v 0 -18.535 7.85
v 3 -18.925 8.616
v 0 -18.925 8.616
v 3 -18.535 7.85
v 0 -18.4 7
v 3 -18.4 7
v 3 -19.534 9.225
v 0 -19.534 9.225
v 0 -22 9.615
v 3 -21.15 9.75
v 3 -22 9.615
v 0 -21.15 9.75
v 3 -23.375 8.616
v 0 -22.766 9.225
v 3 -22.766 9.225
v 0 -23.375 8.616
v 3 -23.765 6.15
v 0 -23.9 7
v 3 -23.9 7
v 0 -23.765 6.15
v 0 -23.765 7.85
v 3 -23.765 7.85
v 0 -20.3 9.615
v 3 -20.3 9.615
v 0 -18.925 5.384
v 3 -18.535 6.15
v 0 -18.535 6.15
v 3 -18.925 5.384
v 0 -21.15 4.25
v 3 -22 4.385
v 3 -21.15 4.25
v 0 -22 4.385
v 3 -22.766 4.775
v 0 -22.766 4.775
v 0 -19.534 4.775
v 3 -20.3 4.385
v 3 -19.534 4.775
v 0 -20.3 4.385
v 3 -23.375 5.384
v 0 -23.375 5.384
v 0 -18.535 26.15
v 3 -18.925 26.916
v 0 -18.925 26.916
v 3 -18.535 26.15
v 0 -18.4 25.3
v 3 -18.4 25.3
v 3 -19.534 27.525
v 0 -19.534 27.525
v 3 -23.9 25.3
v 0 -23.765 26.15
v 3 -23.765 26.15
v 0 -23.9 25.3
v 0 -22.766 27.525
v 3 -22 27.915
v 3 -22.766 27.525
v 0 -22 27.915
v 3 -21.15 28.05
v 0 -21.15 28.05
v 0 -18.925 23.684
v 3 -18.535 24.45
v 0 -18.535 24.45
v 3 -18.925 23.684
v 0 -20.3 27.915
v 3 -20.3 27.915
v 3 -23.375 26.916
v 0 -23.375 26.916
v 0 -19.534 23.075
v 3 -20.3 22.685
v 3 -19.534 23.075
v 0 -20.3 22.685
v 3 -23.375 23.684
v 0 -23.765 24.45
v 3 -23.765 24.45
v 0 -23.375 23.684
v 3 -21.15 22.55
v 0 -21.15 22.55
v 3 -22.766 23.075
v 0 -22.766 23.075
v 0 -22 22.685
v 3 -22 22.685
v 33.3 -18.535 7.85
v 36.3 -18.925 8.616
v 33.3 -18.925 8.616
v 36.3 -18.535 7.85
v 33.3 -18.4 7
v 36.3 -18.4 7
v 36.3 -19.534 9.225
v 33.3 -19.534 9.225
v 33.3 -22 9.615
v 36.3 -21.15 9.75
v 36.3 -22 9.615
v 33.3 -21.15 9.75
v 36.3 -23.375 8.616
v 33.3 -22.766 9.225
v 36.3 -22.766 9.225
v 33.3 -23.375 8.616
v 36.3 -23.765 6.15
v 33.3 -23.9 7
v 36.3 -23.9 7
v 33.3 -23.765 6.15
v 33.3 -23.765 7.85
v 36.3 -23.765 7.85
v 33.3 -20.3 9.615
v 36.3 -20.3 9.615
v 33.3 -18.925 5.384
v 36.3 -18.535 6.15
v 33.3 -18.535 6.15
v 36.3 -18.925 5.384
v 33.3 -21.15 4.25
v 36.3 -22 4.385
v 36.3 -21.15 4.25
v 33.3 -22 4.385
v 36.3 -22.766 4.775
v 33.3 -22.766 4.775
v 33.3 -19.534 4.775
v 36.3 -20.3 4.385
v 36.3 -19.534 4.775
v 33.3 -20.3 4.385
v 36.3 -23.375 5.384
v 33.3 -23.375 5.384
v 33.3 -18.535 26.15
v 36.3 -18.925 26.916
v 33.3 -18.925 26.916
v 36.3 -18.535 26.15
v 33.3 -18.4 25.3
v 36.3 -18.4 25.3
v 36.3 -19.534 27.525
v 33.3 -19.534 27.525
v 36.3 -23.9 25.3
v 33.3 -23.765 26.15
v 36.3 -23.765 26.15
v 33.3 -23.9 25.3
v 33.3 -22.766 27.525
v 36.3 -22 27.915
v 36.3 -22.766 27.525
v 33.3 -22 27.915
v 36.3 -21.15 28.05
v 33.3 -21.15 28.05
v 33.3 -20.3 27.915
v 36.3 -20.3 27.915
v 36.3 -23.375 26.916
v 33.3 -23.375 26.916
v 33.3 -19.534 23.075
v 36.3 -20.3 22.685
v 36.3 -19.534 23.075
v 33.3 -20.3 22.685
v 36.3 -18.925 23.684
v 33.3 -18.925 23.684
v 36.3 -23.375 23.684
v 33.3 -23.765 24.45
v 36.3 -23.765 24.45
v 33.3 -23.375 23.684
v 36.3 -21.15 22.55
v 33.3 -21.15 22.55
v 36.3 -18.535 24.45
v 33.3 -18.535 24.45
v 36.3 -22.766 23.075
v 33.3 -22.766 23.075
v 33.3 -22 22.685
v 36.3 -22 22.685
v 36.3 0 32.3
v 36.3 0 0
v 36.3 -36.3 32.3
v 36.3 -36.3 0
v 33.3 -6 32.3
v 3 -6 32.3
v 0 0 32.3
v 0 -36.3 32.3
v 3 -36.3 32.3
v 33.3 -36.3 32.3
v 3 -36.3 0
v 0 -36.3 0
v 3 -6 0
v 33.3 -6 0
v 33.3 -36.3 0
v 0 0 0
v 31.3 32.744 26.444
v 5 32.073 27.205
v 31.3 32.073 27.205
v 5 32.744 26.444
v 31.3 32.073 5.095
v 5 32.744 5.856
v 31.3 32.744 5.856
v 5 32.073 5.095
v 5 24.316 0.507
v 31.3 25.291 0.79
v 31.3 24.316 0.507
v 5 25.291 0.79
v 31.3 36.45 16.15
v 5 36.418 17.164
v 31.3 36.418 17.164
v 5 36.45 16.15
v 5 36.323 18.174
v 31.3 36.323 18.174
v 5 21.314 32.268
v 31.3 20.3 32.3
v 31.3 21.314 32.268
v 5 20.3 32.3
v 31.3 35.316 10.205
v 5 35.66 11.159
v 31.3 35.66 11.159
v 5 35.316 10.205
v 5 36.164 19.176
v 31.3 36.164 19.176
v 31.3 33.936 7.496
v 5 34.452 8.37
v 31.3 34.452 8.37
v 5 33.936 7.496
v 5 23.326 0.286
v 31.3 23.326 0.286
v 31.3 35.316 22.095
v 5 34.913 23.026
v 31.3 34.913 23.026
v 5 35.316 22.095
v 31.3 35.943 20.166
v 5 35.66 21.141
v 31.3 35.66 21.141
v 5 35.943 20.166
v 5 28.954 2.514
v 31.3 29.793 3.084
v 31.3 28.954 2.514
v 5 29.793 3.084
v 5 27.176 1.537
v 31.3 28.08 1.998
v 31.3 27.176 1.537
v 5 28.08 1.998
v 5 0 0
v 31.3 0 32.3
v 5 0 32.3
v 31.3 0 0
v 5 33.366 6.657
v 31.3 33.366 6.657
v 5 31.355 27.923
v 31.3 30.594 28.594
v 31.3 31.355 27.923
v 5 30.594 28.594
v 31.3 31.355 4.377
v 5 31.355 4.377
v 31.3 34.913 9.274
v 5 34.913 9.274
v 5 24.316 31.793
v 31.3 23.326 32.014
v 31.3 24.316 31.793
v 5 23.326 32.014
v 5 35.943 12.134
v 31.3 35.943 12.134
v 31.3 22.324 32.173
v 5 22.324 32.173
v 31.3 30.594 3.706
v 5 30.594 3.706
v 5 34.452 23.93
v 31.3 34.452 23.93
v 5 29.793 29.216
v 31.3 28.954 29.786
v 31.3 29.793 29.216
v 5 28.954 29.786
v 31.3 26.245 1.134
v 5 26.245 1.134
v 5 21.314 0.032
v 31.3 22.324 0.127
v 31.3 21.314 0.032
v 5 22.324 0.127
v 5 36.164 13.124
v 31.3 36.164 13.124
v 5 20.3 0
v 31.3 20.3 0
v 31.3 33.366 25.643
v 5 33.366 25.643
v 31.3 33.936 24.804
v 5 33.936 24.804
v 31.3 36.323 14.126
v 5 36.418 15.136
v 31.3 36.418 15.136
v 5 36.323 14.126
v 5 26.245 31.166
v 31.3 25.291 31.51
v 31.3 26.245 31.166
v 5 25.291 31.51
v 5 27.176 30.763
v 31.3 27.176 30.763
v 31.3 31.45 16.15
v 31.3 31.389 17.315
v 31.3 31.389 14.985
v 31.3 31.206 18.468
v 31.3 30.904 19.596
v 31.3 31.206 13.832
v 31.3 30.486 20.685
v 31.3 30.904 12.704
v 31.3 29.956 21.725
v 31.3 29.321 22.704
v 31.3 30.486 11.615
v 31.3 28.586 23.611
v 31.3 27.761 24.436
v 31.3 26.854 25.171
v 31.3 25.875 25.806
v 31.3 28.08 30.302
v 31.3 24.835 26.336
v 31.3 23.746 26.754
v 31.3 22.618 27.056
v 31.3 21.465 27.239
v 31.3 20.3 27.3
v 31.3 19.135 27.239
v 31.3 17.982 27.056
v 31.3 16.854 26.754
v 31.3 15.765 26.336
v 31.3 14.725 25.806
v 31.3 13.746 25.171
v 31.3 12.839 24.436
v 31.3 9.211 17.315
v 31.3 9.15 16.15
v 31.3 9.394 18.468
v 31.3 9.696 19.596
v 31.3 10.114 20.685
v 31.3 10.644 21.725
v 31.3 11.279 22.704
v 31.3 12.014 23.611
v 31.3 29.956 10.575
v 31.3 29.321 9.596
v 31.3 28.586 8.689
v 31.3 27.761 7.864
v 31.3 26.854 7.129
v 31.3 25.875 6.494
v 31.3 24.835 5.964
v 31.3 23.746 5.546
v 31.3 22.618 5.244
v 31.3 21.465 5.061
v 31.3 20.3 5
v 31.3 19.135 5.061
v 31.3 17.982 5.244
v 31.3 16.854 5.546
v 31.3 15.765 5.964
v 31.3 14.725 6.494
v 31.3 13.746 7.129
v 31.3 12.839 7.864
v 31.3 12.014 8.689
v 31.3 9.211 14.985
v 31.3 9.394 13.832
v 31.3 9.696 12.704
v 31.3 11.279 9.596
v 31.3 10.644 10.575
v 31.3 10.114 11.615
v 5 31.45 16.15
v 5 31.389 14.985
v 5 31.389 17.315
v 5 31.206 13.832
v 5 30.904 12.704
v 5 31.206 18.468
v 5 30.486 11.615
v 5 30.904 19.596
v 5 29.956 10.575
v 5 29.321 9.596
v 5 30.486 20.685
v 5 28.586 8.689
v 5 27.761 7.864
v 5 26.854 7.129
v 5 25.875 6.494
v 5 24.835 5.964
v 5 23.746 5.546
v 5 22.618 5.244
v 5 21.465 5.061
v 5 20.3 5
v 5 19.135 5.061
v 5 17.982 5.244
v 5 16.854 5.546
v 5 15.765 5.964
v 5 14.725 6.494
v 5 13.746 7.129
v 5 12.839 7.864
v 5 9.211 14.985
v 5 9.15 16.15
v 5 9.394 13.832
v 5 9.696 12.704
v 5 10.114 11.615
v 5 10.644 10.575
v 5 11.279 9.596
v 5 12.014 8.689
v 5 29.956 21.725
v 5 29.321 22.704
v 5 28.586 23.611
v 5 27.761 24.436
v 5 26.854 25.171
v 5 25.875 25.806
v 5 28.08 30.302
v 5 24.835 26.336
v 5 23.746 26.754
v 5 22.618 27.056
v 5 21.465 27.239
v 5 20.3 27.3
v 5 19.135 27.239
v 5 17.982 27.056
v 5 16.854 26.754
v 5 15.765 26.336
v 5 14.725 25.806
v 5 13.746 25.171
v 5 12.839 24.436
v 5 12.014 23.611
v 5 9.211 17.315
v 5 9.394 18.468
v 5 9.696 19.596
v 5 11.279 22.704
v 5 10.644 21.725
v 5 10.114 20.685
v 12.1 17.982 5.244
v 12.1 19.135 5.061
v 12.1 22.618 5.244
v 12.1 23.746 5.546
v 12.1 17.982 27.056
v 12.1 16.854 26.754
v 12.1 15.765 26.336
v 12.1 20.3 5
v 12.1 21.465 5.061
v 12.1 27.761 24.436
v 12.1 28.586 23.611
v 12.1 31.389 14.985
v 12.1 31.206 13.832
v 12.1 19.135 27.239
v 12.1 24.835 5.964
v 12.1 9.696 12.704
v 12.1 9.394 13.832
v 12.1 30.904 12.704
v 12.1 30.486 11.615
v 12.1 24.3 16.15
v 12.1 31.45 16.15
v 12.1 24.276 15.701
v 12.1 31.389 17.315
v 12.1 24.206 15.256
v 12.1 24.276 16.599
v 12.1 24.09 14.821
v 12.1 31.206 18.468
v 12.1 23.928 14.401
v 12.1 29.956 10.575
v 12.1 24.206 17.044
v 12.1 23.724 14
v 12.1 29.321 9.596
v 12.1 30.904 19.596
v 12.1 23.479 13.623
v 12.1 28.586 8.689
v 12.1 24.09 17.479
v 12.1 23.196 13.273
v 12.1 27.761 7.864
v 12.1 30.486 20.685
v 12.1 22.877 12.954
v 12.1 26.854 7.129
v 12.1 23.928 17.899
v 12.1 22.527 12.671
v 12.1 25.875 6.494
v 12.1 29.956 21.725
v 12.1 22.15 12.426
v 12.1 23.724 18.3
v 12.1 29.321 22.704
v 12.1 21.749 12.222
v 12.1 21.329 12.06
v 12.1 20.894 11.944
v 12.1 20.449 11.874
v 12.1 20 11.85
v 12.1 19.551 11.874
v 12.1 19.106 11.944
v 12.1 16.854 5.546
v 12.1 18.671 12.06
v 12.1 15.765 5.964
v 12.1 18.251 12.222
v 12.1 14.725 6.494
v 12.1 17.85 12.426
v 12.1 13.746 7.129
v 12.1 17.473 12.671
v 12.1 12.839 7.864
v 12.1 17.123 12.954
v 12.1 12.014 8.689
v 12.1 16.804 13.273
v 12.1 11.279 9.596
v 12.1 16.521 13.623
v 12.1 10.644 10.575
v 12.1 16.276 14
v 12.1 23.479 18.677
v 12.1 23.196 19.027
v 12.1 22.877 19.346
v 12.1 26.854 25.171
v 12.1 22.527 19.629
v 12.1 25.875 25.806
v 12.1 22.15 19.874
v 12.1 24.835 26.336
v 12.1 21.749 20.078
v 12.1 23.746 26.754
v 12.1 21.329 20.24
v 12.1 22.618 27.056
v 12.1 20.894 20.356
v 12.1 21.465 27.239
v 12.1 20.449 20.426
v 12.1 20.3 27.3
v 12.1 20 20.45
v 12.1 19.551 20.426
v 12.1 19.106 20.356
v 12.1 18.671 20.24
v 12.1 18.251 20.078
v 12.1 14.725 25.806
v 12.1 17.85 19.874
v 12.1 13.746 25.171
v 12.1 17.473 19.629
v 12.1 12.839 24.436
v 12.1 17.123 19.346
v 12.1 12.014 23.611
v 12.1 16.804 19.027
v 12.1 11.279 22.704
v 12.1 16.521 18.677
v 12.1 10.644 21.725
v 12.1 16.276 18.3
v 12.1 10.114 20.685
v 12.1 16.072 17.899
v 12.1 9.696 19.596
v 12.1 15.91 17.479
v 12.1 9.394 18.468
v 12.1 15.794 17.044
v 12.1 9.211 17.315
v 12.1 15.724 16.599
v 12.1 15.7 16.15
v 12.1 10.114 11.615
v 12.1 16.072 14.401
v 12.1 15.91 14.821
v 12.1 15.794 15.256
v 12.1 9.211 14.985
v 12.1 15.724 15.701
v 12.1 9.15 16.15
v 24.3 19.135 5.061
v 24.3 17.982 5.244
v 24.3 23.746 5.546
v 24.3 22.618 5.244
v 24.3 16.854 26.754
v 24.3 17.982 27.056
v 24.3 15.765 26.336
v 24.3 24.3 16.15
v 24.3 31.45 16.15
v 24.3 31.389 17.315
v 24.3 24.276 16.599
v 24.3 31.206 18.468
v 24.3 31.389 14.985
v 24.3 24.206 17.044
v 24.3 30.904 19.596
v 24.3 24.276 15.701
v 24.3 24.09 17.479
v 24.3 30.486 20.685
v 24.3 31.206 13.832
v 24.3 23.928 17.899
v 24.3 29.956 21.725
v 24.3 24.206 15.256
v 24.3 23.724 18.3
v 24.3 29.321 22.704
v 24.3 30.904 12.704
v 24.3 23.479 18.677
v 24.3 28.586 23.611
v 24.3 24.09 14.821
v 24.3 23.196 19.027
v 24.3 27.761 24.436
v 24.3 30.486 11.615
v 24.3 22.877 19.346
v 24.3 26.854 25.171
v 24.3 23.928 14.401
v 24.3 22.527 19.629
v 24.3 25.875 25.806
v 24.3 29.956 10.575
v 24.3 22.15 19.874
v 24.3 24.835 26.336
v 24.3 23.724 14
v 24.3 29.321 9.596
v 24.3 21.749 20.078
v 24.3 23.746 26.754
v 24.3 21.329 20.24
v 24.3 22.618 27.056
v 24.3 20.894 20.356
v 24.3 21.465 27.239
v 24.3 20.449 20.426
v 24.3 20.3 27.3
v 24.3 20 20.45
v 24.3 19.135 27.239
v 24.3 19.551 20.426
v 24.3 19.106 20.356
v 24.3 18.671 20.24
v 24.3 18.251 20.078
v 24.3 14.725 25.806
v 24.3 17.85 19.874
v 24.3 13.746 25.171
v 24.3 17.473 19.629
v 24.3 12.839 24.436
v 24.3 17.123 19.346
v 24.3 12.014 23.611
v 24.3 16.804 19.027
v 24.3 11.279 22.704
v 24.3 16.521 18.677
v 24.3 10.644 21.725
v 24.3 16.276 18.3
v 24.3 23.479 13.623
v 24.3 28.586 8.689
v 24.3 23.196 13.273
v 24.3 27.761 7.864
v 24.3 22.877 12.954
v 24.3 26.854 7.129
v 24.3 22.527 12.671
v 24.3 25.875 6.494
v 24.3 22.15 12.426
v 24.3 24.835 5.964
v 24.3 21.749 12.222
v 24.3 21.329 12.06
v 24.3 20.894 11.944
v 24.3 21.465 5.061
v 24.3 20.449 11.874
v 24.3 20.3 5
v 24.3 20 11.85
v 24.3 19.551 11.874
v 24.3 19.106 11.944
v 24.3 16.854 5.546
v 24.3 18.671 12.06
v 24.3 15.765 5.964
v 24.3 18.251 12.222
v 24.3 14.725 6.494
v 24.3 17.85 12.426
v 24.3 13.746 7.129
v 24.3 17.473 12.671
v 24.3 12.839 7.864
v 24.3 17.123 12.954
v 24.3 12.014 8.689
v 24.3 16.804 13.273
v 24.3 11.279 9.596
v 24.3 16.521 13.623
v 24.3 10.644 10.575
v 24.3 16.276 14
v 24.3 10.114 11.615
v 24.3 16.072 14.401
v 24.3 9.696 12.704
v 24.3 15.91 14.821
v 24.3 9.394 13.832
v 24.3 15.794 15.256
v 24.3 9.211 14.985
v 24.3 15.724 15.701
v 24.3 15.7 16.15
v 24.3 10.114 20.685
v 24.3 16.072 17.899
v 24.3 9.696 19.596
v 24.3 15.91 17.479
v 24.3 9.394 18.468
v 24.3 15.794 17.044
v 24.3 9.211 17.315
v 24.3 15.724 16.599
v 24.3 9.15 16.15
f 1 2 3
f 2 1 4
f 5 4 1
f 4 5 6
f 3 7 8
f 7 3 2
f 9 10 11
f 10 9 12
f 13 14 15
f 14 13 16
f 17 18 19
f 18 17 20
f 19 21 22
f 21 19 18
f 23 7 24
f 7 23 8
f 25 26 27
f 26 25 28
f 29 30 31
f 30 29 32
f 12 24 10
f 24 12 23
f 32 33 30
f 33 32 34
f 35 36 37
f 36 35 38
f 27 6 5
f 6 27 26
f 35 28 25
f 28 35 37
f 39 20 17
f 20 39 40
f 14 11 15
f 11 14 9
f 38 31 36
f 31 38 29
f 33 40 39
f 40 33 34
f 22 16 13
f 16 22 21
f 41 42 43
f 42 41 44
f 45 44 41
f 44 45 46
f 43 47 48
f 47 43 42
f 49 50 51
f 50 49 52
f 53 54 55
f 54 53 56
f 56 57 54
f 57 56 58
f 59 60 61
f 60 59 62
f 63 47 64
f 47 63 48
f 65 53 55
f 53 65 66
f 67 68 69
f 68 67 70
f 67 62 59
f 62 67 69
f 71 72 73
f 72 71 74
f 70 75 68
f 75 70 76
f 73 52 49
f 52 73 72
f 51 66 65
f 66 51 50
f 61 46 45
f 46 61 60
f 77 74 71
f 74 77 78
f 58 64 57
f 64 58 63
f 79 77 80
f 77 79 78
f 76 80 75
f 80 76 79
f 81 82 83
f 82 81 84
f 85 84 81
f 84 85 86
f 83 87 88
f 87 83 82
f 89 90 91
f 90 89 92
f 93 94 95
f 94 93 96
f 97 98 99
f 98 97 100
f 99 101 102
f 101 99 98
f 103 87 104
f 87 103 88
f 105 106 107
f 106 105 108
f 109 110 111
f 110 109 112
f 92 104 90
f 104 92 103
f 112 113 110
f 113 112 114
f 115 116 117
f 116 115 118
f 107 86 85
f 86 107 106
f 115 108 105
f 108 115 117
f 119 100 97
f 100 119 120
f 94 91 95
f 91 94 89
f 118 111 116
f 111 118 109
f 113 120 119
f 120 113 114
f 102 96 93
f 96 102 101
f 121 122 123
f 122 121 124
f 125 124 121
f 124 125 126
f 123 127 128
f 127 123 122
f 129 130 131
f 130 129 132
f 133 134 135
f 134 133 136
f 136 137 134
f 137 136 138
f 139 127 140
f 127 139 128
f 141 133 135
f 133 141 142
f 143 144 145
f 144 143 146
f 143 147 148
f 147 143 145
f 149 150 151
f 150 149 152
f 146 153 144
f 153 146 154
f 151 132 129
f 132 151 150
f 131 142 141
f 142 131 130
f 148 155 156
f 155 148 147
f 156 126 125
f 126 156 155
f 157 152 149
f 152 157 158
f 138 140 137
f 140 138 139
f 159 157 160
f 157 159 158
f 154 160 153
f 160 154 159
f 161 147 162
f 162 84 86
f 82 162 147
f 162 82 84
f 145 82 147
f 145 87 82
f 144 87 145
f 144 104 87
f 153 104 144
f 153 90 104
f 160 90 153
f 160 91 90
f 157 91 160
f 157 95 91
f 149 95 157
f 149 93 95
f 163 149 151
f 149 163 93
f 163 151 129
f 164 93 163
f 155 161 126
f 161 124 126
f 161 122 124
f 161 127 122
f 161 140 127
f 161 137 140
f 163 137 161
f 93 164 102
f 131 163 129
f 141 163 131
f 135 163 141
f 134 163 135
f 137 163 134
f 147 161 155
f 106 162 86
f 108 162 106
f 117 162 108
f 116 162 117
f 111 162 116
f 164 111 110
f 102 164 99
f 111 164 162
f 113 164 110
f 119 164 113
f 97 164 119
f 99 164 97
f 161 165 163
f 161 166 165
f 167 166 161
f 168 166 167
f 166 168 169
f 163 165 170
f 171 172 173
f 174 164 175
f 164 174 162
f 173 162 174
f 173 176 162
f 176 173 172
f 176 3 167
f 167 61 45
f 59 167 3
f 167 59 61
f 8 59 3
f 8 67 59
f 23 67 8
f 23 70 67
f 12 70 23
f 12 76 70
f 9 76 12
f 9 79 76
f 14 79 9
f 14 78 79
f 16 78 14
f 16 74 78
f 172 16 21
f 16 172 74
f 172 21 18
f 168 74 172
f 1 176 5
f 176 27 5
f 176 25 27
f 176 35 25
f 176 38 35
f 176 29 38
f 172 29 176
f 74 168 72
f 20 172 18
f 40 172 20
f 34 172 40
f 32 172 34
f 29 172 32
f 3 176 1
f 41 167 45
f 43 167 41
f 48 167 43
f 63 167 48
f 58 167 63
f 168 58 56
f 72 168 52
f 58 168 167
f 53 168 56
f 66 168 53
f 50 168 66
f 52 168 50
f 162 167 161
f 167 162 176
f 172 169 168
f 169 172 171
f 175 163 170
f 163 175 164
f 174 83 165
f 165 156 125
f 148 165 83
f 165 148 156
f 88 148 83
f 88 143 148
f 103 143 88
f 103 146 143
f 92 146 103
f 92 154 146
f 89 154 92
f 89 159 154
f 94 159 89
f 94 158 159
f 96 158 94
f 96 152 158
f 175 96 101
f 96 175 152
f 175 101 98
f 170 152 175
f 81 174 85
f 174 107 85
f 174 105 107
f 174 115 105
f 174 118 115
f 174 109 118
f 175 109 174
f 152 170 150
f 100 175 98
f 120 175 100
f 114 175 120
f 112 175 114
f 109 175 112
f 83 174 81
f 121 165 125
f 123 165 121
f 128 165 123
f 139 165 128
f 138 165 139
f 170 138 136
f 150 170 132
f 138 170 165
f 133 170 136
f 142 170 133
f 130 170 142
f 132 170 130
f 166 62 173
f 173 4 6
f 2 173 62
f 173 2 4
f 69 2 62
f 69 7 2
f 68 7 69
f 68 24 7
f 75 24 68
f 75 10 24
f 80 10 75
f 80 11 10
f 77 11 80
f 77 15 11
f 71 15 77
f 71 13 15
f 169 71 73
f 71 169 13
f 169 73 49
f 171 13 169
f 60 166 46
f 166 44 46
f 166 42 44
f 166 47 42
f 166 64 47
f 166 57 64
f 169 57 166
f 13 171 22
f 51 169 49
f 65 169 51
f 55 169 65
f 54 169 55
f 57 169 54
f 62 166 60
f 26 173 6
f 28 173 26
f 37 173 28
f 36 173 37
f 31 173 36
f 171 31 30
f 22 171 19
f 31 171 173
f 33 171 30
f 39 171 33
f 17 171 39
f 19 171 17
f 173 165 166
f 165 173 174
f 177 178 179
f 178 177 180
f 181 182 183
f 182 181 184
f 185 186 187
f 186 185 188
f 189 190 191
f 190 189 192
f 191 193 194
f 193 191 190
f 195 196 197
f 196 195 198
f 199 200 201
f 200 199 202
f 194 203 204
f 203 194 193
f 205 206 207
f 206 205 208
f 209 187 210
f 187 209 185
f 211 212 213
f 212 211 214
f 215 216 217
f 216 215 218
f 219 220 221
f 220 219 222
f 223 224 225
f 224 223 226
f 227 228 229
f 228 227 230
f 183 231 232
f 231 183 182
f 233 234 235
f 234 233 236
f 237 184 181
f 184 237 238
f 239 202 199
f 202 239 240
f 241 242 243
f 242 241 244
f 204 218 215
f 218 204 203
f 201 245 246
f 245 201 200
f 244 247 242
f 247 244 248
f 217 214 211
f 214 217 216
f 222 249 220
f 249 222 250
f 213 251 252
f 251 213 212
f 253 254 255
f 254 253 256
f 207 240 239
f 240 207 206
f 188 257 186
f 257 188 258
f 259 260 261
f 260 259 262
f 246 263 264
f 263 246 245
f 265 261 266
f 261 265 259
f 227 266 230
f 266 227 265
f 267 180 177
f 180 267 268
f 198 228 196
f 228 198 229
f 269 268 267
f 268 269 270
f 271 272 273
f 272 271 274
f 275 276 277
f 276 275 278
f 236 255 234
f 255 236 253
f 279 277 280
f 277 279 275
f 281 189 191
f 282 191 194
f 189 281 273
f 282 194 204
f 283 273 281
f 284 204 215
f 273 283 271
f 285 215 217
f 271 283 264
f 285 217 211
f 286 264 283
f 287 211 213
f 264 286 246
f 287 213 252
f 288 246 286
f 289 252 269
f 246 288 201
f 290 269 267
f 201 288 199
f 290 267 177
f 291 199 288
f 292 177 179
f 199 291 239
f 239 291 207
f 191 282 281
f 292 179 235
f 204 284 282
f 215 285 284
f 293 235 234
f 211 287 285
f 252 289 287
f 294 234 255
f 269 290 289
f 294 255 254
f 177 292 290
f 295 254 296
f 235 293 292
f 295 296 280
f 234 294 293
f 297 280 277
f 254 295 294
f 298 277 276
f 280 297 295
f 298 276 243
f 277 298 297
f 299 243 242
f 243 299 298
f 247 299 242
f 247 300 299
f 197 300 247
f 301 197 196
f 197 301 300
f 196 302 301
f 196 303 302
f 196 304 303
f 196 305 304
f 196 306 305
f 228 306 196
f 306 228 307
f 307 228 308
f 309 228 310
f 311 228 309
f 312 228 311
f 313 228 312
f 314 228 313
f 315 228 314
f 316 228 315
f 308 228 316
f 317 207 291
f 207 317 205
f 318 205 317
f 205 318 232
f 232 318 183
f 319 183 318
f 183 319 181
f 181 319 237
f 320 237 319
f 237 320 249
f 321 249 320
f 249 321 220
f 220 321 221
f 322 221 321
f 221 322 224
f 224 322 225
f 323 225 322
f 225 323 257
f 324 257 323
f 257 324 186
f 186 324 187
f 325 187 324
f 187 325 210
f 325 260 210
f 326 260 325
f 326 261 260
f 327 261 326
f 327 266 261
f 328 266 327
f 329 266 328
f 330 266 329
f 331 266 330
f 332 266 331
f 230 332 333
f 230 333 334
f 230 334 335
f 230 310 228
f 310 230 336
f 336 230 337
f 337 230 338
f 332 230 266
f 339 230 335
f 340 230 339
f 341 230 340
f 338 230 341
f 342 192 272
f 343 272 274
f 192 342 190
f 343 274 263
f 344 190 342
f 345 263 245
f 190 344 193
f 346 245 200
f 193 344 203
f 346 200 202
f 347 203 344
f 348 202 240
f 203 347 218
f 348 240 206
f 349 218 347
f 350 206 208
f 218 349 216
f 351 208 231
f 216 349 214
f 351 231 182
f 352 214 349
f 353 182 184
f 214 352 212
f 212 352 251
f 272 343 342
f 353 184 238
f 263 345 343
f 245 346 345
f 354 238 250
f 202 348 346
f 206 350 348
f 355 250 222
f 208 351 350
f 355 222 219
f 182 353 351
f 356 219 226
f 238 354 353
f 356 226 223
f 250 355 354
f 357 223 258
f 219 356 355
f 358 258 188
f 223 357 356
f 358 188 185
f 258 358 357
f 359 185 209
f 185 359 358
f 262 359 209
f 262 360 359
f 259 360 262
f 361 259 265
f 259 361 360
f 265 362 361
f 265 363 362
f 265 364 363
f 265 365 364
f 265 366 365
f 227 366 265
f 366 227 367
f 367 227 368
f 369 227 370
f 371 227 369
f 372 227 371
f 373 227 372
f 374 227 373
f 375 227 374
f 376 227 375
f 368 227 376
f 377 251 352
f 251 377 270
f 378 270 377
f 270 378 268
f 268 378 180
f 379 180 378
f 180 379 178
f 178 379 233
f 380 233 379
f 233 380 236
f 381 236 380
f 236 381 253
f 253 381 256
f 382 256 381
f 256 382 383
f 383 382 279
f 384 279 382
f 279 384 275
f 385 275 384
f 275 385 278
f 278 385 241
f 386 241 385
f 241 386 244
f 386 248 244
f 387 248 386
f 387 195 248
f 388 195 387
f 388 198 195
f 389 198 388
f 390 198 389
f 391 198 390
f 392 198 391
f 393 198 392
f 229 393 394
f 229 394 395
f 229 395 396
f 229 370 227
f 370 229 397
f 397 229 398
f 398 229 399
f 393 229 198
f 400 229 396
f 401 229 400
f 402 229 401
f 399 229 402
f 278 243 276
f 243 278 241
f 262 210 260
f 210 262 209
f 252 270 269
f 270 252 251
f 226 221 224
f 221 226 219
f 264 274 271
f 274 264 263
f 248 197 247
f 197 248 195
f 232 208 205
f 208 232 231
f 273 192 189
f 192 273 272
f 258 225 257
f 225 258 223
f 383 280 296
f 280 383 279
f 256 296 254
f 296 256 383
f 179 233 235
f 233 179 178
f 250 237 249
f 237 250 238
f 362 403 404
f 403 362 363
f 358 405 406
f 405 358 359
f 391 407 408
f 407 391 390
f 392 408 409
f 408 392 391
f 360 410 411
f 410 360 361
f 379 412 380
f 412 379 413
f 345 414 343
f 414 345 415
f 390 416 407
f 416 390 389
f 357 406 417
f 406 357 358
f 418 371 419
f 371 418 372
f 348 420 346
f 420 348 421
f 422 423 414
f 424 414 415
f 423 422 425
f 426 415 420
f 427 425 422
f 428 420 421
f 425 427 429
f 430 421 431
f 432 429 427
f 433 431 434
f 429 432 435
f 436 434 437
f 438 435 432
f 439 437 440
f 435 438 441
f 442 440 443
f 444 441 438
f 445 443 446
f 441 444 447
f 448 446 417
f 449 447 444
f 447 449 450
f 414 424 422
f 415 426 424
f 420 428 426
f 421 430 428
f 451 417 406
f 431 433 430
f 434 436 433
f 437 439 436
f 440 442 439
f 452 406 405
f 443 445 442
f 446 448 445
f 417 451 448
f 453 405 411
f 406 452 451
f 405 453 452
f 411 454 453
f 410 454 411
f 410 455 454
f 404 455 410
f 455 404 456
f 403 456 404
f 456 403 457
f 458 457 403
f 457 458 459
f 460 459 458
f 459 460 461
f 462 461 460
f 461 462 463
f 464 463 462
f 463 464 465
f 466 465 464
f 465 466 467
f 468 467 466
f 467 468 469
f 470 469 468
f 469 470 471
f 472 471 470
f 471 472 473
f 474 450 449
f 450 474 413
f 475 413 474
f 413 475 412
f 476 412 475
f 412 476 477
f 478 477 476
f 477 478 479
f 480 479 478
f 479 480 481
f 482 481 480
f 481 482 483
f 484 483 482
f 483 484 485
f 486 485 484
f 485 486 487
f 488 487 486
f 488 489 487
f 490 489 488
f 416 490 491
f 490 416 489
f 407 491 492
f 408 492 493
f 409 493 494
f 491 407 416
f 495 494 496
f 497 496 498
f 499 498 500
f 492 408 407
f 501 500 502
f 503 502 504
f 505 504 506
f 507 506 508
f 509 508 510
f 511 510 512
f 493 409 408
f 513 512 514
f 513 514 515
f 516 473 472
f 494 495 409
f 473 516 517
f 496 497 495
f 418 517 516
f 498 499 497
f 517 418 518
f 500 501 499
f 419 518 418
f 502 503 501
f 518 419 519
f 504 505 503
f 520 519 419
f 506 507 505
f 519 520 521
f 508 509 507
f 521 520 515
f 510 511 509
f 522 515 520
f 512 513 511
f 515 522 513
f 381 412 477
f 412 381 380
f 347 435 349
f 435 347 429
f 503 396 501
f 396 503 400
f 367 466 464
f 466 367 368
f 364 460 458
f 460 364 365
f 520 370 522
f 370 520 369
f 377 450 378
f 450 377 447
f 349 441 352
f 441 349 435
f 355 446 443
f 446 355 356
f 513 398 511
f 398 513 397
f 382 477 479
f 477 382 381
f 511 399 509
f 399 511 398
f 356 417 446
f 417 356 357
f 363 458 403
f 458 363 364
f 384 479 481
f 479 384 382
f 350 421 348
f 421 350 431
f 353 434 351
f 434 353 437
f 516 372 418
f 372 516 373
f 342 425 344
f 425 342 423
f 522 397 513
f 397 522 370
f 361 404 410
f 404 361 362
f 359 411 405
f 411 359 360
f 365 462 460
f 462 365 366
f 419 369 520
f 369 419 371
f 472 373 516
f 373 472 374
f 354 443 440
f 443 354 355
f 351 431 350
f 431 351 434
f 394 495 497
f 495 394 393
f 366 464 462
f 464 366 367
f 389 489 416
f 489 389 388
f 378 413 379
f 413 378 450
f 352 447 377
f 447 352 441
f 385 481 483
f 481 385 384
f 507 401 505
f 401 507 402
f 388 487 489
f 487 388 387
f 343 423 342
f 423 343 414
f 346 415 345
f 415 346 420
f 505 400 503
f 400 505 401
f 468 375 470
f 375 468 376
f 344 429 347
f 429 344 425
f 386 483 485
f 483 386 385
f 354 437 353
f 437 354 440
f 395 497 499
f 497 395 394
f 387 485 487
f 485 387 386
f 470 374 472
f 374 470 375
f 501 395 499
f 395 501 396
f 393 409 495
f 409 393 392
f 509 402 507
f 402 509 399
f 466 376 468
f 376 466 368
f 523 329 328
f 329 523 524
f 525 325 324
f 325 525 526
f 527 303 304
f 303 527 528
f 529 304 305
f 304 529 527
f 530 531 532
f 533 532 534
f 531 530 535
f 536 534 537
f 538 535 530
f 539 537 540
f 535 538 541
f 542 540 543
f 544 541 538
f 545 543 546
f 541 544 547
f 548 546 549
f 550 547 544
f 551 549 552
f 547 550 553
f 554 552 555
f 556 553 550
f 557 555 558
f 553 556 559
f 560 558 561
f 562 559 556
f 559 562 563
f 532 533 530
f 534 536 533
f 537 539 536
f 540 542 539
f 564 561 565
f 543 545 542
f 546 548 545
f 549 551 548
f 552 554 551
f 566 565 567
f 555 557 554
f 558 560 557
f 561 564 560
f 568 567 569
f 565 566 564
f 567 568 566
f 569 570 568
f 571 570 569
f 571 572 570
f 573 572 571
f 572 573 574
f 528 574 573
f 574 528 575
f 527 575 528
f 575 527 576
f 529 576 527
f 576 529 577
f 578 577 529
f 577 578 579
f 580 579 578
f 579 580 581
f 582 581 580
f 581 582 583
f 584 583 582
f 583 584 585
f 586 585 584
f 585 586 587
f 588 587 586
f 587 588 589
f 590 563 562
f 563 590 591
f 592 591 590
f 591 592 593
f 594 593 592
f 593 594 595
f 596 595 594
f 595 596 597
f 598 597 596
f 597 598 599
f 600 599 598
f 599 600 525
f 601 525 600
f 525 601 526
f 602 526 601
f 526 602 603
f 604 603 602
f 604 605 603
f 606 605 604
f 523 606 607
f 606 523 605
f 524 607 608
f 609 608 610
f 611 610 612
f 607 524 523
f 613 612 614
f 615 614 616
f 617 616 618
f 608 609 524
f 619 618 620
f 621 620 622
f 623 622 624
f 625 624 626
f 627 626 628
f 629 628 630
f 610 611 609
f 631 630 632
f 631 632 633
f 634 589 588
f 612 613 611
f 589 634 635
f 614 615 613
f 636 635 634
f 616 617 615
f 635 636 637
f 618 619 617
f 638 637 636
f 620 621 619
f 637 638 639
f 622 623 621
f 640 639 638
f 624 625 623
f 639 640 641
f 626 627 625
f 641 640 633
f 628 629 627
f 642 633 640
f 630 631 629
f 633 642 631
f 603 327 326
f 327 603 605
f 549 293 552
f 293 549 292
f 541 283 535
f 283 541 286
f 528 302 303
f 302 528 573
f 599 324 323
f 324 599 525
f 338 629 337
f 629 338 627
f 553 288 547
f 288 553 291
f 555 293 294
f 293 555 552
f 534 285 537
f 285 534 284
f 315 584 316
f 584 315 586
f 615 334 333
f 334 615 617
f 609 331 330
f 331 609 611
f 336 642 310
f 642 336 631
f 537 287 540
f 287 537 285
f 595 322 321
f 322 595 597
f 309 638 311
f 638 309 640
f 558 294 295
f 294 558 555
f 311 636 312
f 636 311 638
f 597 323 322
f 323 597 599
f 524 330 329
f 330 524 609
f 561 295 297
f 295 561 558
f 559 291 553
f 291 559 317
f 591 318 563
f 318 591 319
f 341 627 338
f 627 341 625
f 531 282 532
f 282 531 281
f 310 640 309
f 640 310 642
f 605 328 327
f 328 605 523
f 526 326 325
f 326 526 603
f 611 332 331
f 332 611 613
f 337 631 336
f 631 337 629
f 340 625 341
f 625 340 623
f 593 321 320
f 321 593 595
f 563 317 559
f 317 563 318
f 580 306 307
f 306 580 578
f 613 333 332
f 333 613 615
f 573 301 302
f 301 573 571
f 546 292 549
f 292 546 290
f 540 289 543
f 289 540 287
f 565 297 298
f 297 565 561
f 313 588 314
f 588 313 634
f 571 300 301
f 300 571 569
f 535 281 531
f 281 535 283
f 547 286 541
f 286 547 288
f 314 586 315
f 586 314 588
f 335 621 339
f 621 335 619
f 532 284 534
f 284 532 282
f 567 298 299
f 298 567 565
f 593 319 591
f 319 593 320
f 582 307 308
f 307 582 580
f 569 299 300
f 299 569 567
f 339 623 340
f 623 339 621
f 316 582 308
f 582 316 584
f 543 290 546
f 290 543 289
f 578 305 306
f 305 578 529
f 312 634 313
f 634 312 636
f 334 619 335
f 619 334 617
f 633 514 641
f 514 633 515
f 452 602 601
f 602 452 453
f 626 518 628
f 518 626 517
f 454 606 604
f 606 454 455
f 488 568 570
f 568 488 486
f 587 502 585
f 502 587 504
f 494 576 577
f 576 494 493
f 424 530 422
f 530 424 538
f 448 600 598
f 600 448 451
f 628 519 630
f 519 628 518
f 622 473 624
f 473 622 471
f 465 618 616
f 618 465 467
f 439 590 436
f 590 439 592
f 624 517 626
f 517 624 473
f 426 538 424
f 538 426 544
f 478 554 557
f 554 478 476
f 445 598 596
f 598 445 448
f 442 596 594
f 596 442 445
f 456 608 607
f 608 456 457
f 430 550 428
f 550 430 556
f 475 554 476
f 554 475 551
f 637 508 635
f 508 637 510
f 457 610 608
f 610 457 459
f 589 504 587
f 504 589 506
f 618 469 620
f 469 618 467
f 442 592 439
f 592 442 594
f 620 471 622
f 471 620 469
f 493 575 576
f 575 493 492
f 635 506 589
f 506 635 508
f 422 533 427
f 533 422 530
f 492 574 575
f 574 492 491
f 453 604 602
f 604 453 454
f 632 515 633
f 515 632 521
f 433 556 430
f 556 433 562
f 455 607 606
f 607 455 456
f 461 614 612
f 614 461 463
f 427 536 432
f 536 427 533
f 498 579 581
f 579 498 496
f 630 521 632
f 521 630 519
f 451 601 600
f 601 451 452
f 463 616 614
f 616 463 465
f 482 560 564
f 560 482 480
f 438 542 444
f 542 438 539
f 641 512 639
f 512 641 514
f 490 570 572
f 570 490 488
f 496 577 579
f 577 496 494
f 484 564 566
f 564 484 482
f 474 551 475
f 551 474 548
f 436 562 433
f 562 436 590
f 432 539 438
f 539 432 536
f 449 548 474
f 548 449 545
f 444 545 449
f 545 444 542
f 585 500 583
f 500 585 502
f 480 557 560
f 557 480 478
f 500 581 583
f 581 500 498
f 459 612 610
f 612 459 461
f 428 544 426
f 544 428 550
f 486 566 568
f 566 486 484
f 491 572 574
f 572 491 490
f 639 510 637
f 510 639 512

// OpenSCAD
// file: lib/ALU_joint_A.scad
include <../../parameters.scad>

module ALU_joint_A(width) {
    difference() {
        hull() {
            cube([width, 10, 608_bearing_outer_diameter+10]);
            translate([0, 608_bearing_outer_diameter-2, (608_bearing_outer_diameter+10)/2])
                rotate([0, 90, 0])
                    cylinder(d=608_bearing_outer_diameter+10, h=width, $fn=100);
        }
        
        translate([-0.1, 608_bearing_outer_diameter-2, (608_bearing_outer_diameter+10)/2])
                rotate([0, 90, 0])
                    cylinder(d=608_bearing_outer_diameter, h=608_bearing_thickness+0.1, $fn=60);

        translate([width-608_bearing_thickness+0.1, 608_bearing_outer_diameter-2, (608_bearing_outer_diameter+10)/2])
                rotate([0, 90, 0])
                    cylinder(d=608_bearing_outer_diameter, h=608_bearing_thickness+0.1, $fn=60);
        
        translate([0, 20, (608_bearing_outer_diameter+10)/2])
                rotate([0, 90, 0])
                    cylinder(d=M8_screw_diameter, h=width, $fn=60);
    }
}

ALU_joint_A(20);
// file: lib/ALU_profile_holder_side.scad
include <../../parameters.scad>

module ALU_profile_holder_side(height) {
    wall_thickness = ALU_profile_holder_wall_thickness;
    
    //díry na přišroubování k Al profilům
    module screws_holes(diameter) {
        translate([0, 0, 7])
            rotate([90, 0, 90])
                cylinder(d=diameter, h=wall_thickness*2, center=true, $fn=20);
        
        translate([0, 0, height-7])
            rotate([90, 0, 90])
                cylinder(d=diameter, h=wall_thickness*2, center=true, $fn=20);
    }
    
    difference() {
        cube([ALU_profile_width+wall_thickness*2, ALU_profile_width + wall_thickness*2, height]);

        translate([wall_thickness, -0.1, -0.1])
            cube([ALU_profile_width, ALU_profile_width + 0.1, height + 0.2]);
        
        translate([wall_thickness*0.5, ALU_profile_width/2, 0]) {
            screws_holes(M5_screw_diameter);
            translate([ALU_profile_width+wall_thickness, 0, 0]) {
                screws_holes(M5_screw_diameter);
            }
        }
    }
}

ALU_profile_holder_side(30);
// file: ../parameters.scad
maximum_printable_size = 150;

layer_thickness = 0.3;
global_clearance = 0.5;

platform_base_diameter = 400; // Průměr ukotvení válců spodní platformy
platform_base_thickness = 20;
platform_cylinder_medium_length = 250;  // délka pneumatického válce s pístem vysunutým do poloviny rozsahu
platform_base_cylinder_spacing = 38;    //rozestupy spodního a horního ukotvení válců.
platform_top_cylinder_spacing = 30;
platform_top_diameter = 150;   // Průměr horní základny (vdálenost od středu základny do středu kulového kloubu ke kterému je uchycen pneumatický válec)


// screw length step - minimum difference in length between two types of screws
basic_screw_length = 5;


//Screw diameter and nut for M10 [mm]
M10_screw_diameter = 10.4;
M10_head_height = 10;
M10_head_diameter = 16+0.5;
M10_nut_height = 10.5;
M10_nut_diameter = 25.5;
M10_nut_pocket = 22.3;

//Screw diameter for M8 [mm]
M8_screw_diameter = 8.6;
M8_head_height = 8;
M8_head_diameter = 13.5;
M8_nut_height = 7.5;
M8_square_nut_thin_height = 4.5;
M8_nut_diameter = 14.4 + 0.5;
M8_nut_pocket = 13 + 0.5;
M8_washer_diameter = 16;
M8_washer_thickness = 1.5;


//Screw diameter and nut for M6 [mm]
M6_screw_diameter=6.5;
M6_head_diameter = 10+0.5;
M6_head_height = 6;
M6_nut_height = 4.9;
M6_nut_diameter = 11.8;
M6_nut_pocket = 10.4;
M6_square_nut_height = 3;
M6_square_nut_diameter = 10;

//Screw diameter and nut for M5 [mm]
M5_screw_diameter=5.5;
M5_head_height = 5;
M5_head_diameter = 13+0.5;
M5_nut_height = 4.5;
M5_nut_diameter = 9.4;
M5_nut_pocket = 8.4;

//Screw diameter and nut for M4 [mm]
M4_screw_diameter=4.5;
M4_screw_head_height = 4;
M4_nut_height = 3.2;
M4_nut_diameter = 8.4;
M4_nut_pocket = 7.5;

//Screw diameter and nut for M3 [mm]
M3_screw_diameter = 3.2;
M3_nut_height = 2.7;
M3_nut_diameter = 6.6;
M3_nut_pocket = 5.6;
M3_screw_head_height = 3;

//Screw diameter and nut for M2,5 [mm]
M2_5_screw_diameter = 2.7;
M2_5_nut_height = 2.3;
M2_5_nut_diameter = 6;
M2_5_nut_pocket = 5.5;

// kulove lozisko

bearing_efsm_08_h = 33+1;
bearing_efsm_08_m = 22;
bearing_efsm_08_db = 18;
bearing_efsm_08_ag = 10.5;
bearing_efsm_08_n = M4_screw_diameter;
bearing_efsm_08_a1 = 5.5;
bearing_efsm_08_d = 8.25;
bearing_efsm_08_B = 8; // ball height

bearing_efsm_10_h = 38+1;
bearing_efsm_10_m = 26;
bearing_efsm_10_db = 21.9;
bearing_efsm_10_ag = 12+0.2;
bearing_efsm_10_n = M5_screw_diameter;
bearing_efsm_10_a1 = 6.5;
bearing_efsm_10_d = 10.25;


bearing_efsm_12_width = 40+1;
bearing_efsm_12_h = bearing_efsm_12_width;
bearing_efsm_12_boltd = 28/2; // polovina vzdalenosti mezi srouby
bearing_efsm_12_m = bearing_efsm_12_boltd*2;
bearing_efsm_12_db = 25;
bearing_efsm_12_ag = 13;
bearing_efsm_12_a1 = 7;
bearing_efsm_12_n = M5_screw_diameter;
bearing_efsm_12_d = 12.15;
bearing_efsm_12_B = 10; // ball height
bearing_efsm_space = 1;

bearing_efsm_17_width = 54+1;
bearing_efsm_17_h = bearing_efsm_17_width;
bearing_efsm_17_boltd = 38/2; // polovina vzdalenosti mezi srouby
bearing_efsm_17_m = bearing_efsm_17_boltd*2;
bearing_efsm_17_db = 35;
bearing_efsm_17_ag = 18;
bearing_efsm_17_n = M6_screw_diameter;
bearing_efsm_17_a1 = 10;
bearing_efsm_17_B = 17; // ball height

//limcove lozisko
bearing_EFOM_10_L=26; //celkova sirka zakladny
bearing_EFOM_10_d1=10.3;//diametr otvoru real=10 mm
bearing_EFOM_10_dB=22;//diametr vystupku pro ulozeni lozika
bearing_EFOM_10_H=52;//celková delka zakladny
bearing_EFOM_10_J=36;// hole pitch
bearing_EFOM_10_A1=6.5;//vyska pouzdra
bearing_EFOM_10_Ag=12;//celkova vyska
bearing_EFOM_10_N1=5;//sirka otvoru pro sroub
bearing_EFOM_10_N2=8;//delka otvoru pro sroub
bearing_EFOM_10_m=36;//roztec der pro sroub
bearing_EFOM_10_h=9;//vyska lozika


608_bearing_outer_diameter = 22.3;
608_bearing_inner_diameter = 16;
608_bearing_thickness = 7.1;


// 20 KG servo parameters

servo_20kg_axis_offset = 9.375; // jak je osa mimo stredu
servo_20kg_body_x = 42;
servo_20kg_body_y = 21;
servo_20kg_body_z = 40;
servo_20kg_thread_x = 49/2;
servo_20kg_thread_y = 10/2;
servo_20kg_body_below = 10; // jak hluboko je tělo serva pod drzaky na srouby
servo_20kg_below = 25.8; // jak hluboko je páka serva pod drzaky na srouby

servo_20kg_bolt_d = 2.5+0.3;
servo_20kg_nut_d = 5+0.3;


//strain gauge
strain_gauge_width = 12.7;
strain_gauge_length = 75.1;
strain_gauge_screw_distance = 10;

//ALU profile
ALU_profile_width = 30.3;
ALU_profile_holder_wall_thickness = 3;
ALU_profile_groove_width = 8;

//pillow block bearing
//https://www.igus.eu/product/372
//Part no. KSTM-08
KSTM08_screws_distance = 33;         //m
KSTM08_screws_holes_diameter = 4.5;  //d2
KSTM08_flange_thickness = 6;         //h3
KSTM08_case_width = 9;               //C1
KSTM08_case_length = 47;             //a
KSTM08_ball_width = 12;              //B


//ložiska pro malý rotor
bearing_outer_diameter = 10.2;    // Rozměr B1 v nákresu s přídavkem na toleranci otvoru
bearing_thickness = 4;        // Rozměr B2 v nákresu
//bearing_shaft_length = 19.5;    // Rozměr B3 v nákresu, Originalni hodnota 19.5
bearing_shaft_length = 20;    // Rozměr B3 v nákresu


//parametry víčka s telemetrickou anténou
S01_sila_materialu=1.2;
S01_vyska_horni_zavit=10;
S01_hloubka_zavitu=4;
S01_prumer_vnitrni=50;
LO_spodni_prumer=17.2;
LO_vyska_bez_krytu=15;
S01_tolerance_zavit=1.5;
R01_vyska_prekryti_statoru=10;
// main file
include <../parameters.scad>
use <./lib/ALU_profile_holder_side.scad>
use <./lib/ALU_joint_A.scad>

module 888_5003() {
    translate([0, -ALU_profile_width-ALU_profile_holder_wall_thickness*2, 0])
        ALU_profile_holder_side(608_bearing_outer_diameter+10);


    translate([5, 0, 0])
    ALU_joint_A(ALU_profile_width+ALU_profile_holder_wall_thickness*2-10);
}

888_5003();
